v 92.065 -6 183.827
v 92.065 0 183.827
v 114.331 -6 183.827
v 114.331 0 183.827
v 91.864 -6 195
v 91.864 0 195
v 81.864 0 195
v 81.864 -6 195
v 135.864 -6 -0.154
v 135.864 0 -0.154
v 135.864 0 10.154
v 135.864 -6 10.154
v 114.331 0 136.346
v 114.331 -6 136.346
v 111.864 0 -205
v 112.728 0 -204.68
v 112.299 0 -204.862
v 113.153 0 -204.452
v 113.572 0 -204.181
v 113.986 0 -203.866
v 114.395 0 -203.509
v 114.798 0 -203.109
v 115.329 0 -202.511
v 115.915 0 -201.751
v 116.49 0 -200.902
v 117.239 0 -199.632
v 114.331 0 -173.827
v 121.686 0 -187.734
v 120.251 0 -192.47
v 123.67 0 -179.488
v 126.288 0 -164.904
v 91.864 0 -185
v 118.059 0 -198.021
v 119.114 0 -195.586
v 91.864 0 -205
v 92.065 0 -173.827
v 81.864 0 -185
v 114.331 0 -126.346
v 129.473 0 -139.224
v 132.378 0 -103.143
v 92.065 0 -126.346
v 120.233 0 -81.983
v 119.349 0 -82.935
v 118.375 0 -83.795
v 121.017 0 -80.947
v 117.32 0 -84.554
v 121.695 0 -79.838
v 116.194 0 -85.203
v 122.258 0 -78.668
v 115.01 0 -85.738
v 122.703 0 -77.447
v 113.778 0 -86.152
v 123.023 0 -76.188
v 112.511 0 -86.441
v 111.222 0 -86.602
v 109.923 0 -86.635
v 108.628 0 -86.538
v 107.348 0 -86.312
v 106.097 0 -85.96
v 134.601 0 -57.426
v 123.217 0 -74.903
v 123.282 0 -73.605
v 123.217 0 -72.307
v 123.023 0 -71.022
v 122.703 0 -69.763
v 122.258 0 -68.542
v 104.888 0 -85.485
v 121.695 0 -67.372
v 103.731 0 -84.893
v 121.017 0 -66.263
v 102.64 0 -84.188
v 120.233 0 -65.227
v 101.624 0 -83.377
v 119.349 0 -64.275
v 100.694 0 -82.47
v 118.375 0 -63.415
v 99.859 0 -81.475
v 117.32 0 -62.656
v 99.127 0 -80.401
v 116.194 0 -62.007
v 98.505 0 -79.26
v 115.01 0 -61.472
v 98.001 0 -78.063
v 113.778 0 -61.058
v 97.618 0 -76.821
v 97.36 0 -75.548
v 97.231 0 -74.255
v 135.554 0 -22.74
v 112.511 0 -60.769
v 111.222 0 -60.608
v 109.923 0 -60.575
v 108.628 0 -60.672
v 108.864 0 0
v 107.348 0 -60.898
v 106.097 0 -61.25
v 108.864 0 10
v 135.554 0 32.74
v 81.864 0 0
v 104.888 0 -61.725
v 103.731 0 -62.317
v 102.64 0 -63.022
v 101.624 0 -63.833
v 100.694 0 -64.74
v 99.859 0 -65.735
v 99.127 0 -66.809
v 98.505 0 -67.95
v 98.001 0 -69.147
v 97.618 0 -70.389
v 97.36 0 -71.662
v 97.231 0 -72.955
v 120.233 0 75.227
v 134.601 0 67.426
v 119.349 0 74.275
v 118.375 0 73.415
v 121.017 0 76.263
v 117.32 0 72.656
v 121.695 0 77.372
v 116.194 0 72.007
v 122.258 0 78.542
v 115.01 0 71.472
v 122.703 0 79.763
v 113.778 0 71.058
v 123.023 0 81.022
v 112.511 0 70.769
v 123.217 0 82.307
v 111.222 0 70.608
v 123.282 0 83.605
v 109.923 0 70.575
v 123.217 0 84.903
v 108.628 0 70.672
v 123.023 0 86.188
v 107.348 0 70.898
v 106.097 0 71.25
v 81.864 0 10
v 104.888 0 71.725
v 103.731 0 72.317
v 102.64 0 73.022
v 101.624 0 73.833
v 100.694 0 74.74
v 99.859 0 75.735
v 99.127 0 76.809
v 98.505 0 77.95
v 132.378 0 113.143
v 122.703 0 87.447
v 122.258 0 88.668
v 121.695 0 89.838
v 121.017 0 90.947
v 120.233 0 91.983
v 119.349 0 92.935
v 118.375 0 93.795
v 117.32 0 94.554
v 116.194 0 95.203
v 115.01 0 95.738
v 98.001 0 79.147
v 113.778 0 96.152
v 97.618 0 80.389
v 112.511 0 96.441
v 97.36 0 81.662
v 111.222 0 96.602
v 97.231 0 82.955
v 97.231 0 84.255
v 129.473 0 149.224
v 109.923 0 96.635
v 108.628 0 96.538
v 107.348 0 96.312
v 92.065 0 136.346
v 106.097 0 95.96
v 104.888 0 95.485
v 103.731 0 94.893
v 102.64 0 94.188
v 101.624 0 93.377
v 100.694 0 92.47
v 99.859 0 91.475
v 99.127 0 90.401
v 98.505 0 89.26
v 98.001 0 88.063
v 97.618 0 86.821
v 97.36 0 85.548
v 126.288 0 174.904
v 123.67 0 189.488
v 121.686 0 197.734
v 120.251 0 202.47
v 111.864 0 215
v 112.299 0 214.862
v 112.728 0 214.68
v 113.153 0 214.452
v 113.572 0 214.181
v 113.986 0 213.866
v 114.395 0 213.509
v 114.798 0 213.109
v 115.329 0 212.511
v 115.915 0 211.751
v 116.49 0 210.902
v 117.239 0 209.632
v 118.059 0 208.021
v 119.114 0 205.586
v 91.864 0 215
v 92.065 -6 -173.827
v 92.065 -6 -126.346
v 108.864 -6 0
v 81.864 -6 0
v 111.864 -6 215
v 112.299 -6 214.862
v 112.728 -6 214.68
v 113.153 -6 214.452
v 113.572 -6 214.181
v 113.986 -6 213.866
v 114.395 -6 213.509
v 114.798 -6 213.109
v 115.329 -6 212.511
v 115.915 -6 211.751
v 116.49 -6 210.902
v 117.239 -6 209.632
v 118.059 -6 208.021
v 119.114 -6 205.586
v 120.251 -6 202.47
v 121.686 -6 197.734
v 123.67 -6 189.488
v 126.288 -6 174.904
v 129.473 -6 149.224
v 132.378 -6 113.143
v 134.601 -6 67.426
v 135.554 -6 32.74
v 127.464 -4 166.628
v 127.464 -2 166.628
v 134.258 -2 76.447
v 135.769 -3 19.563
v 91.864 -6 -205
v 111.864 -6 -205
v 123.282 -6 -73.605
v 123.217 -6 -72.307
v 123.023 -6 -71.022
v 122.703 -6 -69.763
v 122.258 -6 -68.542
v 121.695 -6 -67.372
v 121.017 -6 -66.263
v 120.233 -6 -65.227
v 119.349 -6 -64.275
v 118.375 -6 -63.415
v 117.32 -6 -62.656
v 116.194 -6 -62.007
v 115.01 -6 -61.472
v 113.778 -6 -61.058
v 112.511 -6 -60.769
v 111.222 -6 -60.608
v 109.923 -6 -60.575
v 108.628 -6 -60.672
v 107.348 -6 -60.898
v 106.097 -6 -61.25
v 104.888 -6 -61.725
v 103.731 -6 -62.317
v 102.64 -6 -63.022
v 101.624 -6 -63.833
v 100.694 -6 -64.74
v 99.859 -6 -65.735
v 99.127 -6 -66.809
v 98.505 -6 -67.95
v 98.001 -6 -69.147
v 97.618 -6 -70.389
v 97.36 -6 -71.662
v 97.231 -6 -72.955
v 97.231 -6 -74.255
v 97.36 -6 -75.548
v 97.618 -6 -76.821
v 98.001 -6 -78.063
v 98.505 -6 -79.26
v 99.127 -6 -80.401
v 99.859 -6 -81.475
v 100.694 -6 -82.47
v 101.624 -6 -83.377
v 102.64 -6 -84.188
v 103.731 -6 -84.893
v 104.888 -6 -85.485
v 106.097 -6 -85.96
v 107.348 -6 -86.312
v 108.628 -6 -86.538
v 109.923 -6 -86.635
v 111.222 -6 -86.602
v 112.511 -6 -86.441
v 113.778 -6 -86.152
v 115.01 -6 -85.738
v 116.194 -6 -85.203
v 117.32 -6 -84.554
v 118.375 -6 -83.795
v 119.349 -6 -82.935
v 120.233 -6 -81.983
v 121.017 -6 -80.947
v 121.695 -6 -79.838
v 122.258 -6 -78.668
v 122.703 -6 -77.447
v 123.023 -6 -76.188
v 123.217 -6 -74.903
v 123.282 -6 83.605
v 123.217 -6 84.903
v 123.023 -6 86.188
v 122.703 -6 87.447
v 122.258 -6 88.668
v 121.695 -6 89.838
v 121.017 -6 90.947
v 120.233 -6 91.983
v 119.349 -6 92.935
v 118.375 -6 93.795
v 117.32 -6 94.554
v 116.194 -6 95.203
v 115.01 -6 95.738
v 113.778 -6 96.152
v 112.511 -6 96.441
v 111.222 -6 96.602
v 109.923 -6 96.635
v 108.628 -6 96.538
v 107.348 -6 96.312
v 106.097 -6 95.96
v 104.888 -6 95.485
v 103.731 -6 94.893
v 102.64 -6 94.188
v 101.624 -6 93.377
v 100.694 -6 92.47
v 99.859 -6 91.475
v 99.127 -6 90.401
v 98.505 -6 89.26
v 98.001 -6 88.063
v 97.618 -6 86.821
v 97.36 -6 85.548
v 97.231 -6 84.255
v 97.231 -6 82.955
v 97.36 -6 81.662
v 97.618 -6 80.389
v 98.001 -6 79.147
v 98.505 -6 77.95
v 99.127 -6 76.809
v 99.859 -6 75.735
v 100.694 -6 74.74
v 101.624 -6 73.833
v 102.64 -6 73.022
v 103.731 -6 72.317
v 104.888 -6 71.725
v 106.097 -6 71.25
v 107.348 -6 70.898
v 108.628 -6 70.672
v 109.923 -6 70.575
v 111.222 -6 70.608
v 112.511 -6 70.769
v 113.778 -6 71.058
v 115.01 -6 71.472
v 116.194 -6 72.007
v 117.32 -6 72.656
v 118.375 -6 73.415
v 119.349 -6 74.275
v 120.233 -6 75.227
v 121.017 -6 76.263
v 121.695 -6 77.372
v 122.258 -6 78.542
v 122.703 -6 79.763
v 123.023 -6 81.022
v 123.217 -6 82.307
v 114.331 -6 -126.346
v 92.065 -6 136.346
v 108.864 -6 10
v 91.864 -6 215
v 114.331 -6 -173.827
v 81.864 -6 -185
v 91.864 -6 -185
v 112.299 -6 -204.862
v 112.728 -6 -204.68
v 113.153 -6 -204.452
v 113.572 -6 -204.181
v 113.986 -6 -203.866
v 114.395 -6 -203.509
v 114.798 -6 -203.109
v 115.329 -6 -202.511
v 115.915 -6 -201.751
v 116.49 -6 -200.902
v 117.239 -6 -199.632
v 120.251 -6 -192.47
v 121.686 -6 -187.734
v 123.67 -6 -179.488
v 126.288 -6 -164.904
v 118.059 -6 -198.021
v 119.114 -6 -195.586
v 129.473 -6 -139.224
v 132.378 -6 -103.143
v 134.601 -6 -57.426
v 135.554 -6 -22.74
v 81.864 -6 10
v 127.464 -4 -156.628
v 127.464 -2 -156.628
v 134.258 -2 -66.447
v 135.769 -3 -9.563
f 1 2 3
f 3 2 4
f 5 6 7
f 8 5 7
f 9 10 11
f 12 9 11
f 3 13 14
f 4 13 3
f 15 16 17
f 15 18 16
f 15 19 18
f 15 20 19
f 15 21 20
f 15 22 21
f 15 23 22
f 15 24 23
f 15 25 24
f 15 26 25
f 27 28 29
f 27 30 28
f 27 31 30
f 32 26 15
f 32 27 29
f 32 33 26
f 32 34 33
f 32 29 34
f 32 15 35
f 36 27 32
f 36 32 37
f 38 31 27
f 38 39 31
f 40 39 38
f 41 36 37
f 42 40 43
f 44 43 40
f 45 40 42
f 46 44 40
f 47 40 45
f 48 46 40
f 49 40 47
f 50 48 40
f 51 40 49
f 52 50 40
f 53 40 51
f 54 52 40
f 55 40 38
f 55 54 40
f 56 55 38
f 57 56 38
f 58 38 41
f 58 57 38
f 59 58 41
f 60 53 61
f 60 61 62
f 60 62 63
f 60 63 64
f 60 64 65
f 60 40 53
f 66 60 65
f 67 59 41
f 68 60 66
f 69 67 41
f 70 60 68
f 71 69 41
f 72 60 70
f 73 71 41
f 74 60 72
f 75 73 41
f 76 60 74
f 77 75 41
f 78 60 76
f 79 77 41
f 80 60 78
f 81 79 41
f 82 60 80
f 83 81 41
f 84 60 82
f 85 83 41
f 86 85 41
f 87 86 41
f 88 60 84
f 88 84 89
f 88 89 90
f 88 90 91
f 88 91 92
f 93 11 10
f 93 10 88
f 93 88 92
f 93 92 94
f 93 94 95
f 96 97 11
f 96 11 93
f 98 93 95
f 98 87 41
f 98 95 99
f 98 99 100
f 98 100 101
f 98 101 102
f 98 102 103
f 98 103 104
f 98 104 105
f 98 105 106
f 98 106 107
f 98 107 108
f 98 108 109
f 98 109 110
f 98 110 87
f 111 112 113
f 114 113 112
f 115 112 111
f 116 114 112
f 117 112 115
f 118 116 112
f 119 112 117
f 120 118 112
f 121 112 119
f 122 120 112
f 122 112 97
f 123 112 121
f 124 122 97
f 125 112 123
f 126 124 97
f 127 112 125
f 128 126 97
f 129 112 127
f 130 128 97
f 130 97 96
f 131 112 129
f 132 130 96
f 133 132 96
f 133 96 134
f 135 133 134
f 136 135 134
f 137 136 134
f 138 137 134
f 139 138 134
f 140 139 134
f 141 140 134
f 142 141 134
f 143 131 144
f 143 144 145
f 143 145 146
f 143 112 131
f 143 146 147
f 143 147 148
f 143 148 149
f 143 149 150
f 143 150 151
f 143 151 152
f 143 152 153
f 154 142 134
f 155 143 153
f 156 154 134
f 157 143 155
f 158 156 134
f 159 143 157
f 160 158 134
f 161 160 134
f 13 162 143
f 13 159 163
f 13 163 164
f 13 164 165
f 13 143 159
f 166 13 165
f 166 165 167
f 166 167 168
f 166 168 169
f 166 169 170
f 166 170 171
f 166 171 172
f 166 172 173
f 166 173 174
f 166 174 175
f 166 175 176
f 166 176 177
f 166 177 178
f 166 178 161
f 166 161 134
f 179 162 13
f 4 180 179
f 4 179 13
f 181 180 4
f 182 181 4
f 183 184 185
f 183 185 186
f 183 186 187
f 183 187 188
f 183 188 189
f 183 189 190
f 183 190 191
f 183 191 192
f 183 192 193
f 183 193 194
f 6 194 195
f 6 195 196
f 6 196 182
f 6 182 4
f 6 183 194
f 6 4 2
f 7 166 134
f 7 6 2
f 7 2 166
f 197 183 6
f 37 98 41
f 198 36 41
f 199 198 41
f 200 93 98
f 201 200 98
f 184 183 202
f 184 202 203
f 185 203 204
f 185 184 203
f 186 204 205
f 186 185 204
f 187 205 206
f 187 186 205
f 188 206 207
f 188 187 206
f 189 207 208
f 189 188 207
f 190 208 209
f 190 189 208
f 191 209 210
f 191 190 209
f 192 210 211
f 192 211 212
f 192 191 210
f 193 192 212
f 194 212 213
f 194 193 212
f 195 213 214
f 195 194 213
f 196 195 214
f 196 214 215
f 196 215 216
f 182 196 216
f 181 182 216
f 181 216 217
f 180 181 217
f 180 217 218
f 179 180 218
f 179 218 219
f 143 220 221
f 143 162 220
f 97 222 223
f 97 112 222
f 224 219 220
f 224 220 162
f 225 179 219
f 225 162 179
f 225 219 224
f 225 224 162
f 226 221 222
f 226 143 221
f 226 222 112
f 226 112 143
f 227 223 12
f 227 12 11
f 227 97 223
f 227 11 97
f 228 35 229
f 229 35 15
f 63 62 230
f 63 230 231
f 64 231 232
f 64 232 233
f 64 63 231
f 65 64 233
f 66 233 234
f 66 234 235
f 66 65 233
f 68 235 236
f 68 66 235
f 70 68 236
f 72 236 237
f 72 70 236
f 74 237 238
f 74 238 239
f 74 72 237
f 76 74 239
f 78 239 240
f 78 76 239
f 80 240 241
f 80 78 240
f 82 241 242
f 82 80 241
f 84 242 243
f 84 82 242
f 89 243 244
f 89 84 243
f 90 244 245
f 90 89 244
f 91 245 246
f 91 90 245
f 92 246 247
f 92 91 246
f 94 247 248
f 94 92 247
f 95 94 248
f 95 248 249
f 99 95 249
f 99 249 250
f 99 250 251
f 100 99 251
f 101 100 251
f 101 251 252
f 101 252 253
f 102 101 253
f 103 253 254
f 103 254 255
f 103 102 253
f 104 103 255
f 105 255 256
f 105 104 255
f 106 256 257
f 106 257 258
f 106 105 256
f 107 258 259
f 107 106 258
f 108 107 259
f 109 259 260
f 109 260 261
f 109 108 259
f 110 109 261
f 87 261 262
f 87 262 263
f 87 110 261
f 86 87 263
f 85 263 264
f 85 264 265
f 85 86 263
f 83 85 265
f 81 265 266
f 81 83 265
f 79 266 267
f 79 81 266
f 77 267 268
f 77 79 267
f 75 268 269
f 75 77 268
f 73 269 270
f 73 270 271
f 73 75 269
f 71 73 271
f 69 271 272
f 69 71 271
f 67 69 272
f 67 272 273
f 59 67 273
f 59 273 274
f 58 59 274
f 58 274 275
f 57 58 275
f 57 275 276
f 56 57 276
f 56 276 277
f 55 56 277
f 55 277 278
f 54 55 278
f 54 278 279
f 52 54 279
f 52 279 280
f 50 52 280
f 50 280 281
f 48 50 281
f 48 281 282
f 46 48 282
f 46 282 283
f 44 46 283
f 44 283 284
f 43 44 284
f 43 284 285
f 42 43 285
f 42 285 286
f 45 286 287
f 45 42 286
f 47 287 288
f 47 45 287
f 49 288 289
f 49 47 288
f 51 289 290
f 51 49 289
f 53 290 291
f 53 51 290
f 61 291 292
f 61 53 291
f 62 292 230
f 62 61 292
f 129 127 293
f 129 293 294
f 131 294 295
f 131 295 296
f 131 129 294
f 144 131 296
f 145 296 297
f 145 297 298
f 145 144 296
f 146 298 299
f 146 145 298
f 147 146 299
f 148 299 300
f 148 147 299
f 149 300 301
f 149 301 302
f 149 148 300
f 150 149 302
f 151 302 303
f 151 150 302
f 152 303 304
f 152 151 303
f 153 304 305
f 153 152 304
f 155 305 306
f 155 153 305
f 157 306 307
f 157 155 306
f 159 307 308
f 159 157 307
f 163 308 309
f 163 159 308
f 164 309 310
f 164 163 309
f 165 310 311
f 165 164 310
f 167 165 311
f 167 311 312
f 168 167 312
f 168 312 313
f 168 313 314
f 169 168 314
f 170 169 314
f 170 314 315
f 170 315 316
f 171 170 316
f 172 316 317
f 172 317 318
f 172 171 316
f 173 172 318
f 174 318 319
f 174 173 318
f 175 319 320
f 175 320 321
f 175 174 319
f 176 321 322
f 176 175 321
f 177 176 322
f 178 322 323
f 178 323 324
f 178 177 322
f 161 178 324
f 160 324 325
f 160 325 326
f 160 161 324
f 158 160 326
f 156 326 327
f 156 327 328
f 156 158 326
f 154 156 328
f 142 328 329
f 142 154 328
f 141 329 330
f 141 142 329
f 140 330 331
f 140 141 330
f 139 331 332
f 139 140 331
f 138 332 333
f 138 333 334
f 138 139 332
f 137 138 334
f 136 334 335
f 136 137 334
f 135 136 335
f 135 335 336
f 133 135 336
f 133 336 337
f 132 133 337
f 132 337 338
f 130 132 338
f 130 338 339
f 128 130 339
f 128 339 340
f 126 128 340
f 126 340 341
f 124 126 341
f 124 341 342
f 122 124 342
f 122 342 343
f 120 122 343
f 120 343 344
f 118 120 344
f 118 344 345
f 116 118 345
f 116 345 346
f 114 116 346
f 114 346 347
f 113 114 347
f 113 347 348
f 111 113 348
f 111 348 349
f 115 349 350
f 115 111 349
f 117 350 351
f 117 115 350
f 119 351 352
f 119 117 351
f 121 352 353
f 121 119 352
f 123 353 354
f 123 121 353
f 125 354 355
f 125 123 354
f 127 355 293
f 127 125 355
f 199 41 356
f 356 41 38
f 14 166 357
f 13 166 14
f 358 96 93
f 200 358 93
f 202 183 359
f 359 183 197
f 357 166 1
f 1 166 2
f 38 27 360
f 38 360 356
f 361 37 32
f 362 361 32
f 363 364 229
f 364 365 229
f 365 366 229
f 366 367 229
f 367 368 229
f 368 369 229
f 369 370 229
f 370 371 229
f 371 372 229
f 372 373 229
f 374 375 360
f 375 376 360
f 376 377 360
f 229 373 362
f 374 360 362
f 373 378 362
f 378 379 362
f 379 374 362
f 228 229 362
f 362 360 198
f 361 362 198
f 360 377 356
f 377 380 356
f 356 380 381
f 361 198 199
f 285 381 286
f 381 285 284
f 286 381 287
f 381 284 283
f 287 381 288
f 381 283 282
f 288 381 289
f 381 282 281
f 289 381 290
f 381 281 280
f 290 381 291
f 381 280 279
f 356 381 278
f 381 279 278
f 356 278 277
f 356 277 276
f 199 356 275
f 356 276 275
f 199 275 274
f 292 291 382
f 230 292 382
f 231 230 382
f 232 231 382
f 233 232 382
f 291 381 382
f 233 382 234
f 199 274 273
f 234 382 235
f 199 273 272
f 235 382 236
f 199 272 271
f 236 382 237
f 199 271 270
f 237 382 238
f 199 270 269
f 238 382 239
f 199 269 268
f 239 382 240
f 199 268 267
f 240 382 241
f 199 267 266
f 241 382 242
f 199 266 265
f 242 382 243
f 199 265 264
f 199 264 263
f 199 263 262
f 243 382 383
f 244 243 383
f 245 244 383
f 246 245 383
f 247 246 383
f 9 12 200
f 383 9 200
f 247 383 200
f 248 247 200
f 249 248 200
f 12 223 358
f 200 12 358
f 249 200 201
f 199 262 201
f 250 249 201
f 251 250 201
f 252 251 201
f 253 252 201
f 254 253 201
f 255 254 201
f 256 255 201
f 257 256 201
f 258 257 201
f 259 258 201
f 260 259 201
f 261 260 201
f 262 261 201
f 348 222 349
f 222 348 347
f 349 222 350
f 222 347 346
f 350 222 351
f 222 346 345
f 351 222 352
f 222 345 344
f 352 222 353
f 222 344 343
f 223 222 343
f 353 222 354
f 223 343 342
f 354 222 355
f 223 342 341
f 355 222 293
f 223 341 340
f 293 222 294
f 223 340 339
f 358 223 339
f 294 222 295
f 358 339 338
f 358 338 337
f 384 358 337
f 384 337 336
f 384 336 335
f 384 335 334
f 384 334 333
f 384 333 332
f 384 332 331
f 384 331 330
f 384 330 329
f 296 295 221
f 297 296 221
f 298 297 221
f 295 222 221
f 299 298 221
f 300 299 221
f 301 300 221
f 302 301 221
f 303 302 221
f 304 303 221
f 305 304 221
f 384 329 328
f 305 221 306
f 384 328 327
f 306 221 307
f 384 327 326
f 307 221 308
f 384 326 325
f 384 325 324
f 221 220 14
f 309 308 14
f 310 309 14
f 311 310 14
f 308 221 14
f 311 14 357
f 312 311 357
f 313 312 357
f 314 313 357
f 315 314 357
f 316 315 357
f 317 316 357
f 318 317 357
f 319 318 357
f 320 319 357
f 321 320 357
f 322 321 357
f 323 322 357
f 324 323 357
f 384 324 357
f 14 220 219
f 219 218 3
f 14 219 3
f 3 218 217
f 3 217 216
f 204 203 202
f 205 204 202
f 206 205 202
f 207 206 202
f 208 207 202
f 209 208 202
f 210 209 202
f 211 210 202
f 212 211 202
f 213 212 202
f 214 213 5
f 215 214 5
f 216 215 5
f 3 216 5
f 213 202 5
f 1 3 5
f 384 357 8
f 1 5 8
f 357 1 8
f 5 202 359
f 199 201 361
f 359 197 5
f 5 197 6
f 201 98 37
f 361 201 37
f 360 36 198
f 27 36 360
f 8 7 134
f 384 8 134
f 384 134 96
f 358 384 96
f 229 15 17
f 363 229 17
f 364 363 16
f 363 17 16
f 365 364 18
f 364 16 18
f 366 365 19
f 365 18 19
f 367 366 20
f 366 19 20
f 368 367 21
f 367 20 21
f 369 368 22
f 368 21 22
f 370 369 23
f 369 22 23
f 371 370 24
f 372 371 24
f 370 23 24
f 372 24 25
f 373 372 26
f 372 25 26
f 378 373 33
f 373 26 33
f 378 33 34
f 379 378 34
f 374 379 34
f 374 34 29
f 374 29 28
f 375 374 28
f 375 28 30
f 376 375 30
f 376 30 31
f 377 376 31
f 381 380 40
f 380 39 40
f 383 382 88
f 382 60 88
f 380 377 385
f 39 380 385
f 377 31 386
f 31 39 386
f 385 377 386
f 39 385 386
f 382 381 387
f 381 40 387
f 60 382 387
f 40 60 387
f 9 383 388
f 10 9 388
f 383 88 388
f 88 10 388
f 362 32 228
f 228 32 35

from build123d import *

# Parameters (mm, degrees)
F0_W     = 22.2654491663
F0_H     = 47.4806427956
F0_R     = 13.033720186
F1_DEPTH = 6


# Not quite as in the source:
# - a feature names something its author has since deleted; it is built from what else it names


with BuildPart() as f1:
    # F0 (on Front) → F1 (new body)
    with BuildSketch(Plane.XZ):
        with BuildLine():
            add(Edge.make_bspline(
                [(111.8640829768, 215), (133.0716213469, 209.4330211779), (135.6474762559, 42.6029998371), (135.8640829768, 10.1536091521)],
                knots=[0, 0, 0, 0, 186.7738886147, 186.7738886147, 186.7738886147, 186.7738886147], degree=3))
            Line((111.8640829768, 215), (91.8640829768, 215))
            Line((91.8640829768, 215), (91.8640829768, 195))
            Line((91.8640829768, 195), (81.8640829768, 195))
            Line((81.8640829768, 195), (81.8640829768, 10))
            Line((81.8640829768, 10), (108.8640829768, 10))
            Line((108.8640829768, 10), (108.8640829768, 5))
            Line((108.8640829768, 5), (135.8640829768, 5))
            Line((135.8640829768, 5), (135.8640829768, 10.1536091521))
        make_face()
        with Locations((103.1980912897, 160.0865775181)):
            Rectangle(F0_W, F0_H, mode=Mode.SUBTRACT)
        with Locations((110.2482031796, 83.6049893333)):
            Circle(F0_R, mode=Mode.SUBTRACT)
        with BuildLine():
            Line((135.8640829768, -0.1536091521), (135.8640829768, 5))
            Line((135.8640829768, 5), (108.8640829768, 5))
            Line((108.8640829768, 5), (108.8640829768, 0))
            Line((108.8640829768, 0), (81.8640829768, 0))
            Line((81.8640829768, 0), (81.8640829768, -185))
            Line((81.8640829768, -185), (91.8640829768, -185))
            Line((91.8640829768, -185), (91.8640829768, -205))
            Line((91.8640829768, -205), (111.8640829768, -205))
            add(Edge.make_bspline(
                [(111.8640829768, -205), (133.0716213469, -199.4330211779), (135.6474762559, -32.6029998371), (135.8640829768, -0.1536091521)],
                knots=[0, 0, 0, 0, 186.7738886147, 186.7738886147, 186.7738886147, 186.7738886147], degree=3))
        make_face()
        with Locations((103.1980912897, -150.0865775181)):
            Rectangle(F0_W, F0_H, mode=Mode.SUBTRACT)
        with Locations((110.2482031796, -73.6049893333)):
            Circle(F0_R, mode=Mode.SUBTRACT)
    extrude(amount=F1_DEPTH)


solid = f1.part
